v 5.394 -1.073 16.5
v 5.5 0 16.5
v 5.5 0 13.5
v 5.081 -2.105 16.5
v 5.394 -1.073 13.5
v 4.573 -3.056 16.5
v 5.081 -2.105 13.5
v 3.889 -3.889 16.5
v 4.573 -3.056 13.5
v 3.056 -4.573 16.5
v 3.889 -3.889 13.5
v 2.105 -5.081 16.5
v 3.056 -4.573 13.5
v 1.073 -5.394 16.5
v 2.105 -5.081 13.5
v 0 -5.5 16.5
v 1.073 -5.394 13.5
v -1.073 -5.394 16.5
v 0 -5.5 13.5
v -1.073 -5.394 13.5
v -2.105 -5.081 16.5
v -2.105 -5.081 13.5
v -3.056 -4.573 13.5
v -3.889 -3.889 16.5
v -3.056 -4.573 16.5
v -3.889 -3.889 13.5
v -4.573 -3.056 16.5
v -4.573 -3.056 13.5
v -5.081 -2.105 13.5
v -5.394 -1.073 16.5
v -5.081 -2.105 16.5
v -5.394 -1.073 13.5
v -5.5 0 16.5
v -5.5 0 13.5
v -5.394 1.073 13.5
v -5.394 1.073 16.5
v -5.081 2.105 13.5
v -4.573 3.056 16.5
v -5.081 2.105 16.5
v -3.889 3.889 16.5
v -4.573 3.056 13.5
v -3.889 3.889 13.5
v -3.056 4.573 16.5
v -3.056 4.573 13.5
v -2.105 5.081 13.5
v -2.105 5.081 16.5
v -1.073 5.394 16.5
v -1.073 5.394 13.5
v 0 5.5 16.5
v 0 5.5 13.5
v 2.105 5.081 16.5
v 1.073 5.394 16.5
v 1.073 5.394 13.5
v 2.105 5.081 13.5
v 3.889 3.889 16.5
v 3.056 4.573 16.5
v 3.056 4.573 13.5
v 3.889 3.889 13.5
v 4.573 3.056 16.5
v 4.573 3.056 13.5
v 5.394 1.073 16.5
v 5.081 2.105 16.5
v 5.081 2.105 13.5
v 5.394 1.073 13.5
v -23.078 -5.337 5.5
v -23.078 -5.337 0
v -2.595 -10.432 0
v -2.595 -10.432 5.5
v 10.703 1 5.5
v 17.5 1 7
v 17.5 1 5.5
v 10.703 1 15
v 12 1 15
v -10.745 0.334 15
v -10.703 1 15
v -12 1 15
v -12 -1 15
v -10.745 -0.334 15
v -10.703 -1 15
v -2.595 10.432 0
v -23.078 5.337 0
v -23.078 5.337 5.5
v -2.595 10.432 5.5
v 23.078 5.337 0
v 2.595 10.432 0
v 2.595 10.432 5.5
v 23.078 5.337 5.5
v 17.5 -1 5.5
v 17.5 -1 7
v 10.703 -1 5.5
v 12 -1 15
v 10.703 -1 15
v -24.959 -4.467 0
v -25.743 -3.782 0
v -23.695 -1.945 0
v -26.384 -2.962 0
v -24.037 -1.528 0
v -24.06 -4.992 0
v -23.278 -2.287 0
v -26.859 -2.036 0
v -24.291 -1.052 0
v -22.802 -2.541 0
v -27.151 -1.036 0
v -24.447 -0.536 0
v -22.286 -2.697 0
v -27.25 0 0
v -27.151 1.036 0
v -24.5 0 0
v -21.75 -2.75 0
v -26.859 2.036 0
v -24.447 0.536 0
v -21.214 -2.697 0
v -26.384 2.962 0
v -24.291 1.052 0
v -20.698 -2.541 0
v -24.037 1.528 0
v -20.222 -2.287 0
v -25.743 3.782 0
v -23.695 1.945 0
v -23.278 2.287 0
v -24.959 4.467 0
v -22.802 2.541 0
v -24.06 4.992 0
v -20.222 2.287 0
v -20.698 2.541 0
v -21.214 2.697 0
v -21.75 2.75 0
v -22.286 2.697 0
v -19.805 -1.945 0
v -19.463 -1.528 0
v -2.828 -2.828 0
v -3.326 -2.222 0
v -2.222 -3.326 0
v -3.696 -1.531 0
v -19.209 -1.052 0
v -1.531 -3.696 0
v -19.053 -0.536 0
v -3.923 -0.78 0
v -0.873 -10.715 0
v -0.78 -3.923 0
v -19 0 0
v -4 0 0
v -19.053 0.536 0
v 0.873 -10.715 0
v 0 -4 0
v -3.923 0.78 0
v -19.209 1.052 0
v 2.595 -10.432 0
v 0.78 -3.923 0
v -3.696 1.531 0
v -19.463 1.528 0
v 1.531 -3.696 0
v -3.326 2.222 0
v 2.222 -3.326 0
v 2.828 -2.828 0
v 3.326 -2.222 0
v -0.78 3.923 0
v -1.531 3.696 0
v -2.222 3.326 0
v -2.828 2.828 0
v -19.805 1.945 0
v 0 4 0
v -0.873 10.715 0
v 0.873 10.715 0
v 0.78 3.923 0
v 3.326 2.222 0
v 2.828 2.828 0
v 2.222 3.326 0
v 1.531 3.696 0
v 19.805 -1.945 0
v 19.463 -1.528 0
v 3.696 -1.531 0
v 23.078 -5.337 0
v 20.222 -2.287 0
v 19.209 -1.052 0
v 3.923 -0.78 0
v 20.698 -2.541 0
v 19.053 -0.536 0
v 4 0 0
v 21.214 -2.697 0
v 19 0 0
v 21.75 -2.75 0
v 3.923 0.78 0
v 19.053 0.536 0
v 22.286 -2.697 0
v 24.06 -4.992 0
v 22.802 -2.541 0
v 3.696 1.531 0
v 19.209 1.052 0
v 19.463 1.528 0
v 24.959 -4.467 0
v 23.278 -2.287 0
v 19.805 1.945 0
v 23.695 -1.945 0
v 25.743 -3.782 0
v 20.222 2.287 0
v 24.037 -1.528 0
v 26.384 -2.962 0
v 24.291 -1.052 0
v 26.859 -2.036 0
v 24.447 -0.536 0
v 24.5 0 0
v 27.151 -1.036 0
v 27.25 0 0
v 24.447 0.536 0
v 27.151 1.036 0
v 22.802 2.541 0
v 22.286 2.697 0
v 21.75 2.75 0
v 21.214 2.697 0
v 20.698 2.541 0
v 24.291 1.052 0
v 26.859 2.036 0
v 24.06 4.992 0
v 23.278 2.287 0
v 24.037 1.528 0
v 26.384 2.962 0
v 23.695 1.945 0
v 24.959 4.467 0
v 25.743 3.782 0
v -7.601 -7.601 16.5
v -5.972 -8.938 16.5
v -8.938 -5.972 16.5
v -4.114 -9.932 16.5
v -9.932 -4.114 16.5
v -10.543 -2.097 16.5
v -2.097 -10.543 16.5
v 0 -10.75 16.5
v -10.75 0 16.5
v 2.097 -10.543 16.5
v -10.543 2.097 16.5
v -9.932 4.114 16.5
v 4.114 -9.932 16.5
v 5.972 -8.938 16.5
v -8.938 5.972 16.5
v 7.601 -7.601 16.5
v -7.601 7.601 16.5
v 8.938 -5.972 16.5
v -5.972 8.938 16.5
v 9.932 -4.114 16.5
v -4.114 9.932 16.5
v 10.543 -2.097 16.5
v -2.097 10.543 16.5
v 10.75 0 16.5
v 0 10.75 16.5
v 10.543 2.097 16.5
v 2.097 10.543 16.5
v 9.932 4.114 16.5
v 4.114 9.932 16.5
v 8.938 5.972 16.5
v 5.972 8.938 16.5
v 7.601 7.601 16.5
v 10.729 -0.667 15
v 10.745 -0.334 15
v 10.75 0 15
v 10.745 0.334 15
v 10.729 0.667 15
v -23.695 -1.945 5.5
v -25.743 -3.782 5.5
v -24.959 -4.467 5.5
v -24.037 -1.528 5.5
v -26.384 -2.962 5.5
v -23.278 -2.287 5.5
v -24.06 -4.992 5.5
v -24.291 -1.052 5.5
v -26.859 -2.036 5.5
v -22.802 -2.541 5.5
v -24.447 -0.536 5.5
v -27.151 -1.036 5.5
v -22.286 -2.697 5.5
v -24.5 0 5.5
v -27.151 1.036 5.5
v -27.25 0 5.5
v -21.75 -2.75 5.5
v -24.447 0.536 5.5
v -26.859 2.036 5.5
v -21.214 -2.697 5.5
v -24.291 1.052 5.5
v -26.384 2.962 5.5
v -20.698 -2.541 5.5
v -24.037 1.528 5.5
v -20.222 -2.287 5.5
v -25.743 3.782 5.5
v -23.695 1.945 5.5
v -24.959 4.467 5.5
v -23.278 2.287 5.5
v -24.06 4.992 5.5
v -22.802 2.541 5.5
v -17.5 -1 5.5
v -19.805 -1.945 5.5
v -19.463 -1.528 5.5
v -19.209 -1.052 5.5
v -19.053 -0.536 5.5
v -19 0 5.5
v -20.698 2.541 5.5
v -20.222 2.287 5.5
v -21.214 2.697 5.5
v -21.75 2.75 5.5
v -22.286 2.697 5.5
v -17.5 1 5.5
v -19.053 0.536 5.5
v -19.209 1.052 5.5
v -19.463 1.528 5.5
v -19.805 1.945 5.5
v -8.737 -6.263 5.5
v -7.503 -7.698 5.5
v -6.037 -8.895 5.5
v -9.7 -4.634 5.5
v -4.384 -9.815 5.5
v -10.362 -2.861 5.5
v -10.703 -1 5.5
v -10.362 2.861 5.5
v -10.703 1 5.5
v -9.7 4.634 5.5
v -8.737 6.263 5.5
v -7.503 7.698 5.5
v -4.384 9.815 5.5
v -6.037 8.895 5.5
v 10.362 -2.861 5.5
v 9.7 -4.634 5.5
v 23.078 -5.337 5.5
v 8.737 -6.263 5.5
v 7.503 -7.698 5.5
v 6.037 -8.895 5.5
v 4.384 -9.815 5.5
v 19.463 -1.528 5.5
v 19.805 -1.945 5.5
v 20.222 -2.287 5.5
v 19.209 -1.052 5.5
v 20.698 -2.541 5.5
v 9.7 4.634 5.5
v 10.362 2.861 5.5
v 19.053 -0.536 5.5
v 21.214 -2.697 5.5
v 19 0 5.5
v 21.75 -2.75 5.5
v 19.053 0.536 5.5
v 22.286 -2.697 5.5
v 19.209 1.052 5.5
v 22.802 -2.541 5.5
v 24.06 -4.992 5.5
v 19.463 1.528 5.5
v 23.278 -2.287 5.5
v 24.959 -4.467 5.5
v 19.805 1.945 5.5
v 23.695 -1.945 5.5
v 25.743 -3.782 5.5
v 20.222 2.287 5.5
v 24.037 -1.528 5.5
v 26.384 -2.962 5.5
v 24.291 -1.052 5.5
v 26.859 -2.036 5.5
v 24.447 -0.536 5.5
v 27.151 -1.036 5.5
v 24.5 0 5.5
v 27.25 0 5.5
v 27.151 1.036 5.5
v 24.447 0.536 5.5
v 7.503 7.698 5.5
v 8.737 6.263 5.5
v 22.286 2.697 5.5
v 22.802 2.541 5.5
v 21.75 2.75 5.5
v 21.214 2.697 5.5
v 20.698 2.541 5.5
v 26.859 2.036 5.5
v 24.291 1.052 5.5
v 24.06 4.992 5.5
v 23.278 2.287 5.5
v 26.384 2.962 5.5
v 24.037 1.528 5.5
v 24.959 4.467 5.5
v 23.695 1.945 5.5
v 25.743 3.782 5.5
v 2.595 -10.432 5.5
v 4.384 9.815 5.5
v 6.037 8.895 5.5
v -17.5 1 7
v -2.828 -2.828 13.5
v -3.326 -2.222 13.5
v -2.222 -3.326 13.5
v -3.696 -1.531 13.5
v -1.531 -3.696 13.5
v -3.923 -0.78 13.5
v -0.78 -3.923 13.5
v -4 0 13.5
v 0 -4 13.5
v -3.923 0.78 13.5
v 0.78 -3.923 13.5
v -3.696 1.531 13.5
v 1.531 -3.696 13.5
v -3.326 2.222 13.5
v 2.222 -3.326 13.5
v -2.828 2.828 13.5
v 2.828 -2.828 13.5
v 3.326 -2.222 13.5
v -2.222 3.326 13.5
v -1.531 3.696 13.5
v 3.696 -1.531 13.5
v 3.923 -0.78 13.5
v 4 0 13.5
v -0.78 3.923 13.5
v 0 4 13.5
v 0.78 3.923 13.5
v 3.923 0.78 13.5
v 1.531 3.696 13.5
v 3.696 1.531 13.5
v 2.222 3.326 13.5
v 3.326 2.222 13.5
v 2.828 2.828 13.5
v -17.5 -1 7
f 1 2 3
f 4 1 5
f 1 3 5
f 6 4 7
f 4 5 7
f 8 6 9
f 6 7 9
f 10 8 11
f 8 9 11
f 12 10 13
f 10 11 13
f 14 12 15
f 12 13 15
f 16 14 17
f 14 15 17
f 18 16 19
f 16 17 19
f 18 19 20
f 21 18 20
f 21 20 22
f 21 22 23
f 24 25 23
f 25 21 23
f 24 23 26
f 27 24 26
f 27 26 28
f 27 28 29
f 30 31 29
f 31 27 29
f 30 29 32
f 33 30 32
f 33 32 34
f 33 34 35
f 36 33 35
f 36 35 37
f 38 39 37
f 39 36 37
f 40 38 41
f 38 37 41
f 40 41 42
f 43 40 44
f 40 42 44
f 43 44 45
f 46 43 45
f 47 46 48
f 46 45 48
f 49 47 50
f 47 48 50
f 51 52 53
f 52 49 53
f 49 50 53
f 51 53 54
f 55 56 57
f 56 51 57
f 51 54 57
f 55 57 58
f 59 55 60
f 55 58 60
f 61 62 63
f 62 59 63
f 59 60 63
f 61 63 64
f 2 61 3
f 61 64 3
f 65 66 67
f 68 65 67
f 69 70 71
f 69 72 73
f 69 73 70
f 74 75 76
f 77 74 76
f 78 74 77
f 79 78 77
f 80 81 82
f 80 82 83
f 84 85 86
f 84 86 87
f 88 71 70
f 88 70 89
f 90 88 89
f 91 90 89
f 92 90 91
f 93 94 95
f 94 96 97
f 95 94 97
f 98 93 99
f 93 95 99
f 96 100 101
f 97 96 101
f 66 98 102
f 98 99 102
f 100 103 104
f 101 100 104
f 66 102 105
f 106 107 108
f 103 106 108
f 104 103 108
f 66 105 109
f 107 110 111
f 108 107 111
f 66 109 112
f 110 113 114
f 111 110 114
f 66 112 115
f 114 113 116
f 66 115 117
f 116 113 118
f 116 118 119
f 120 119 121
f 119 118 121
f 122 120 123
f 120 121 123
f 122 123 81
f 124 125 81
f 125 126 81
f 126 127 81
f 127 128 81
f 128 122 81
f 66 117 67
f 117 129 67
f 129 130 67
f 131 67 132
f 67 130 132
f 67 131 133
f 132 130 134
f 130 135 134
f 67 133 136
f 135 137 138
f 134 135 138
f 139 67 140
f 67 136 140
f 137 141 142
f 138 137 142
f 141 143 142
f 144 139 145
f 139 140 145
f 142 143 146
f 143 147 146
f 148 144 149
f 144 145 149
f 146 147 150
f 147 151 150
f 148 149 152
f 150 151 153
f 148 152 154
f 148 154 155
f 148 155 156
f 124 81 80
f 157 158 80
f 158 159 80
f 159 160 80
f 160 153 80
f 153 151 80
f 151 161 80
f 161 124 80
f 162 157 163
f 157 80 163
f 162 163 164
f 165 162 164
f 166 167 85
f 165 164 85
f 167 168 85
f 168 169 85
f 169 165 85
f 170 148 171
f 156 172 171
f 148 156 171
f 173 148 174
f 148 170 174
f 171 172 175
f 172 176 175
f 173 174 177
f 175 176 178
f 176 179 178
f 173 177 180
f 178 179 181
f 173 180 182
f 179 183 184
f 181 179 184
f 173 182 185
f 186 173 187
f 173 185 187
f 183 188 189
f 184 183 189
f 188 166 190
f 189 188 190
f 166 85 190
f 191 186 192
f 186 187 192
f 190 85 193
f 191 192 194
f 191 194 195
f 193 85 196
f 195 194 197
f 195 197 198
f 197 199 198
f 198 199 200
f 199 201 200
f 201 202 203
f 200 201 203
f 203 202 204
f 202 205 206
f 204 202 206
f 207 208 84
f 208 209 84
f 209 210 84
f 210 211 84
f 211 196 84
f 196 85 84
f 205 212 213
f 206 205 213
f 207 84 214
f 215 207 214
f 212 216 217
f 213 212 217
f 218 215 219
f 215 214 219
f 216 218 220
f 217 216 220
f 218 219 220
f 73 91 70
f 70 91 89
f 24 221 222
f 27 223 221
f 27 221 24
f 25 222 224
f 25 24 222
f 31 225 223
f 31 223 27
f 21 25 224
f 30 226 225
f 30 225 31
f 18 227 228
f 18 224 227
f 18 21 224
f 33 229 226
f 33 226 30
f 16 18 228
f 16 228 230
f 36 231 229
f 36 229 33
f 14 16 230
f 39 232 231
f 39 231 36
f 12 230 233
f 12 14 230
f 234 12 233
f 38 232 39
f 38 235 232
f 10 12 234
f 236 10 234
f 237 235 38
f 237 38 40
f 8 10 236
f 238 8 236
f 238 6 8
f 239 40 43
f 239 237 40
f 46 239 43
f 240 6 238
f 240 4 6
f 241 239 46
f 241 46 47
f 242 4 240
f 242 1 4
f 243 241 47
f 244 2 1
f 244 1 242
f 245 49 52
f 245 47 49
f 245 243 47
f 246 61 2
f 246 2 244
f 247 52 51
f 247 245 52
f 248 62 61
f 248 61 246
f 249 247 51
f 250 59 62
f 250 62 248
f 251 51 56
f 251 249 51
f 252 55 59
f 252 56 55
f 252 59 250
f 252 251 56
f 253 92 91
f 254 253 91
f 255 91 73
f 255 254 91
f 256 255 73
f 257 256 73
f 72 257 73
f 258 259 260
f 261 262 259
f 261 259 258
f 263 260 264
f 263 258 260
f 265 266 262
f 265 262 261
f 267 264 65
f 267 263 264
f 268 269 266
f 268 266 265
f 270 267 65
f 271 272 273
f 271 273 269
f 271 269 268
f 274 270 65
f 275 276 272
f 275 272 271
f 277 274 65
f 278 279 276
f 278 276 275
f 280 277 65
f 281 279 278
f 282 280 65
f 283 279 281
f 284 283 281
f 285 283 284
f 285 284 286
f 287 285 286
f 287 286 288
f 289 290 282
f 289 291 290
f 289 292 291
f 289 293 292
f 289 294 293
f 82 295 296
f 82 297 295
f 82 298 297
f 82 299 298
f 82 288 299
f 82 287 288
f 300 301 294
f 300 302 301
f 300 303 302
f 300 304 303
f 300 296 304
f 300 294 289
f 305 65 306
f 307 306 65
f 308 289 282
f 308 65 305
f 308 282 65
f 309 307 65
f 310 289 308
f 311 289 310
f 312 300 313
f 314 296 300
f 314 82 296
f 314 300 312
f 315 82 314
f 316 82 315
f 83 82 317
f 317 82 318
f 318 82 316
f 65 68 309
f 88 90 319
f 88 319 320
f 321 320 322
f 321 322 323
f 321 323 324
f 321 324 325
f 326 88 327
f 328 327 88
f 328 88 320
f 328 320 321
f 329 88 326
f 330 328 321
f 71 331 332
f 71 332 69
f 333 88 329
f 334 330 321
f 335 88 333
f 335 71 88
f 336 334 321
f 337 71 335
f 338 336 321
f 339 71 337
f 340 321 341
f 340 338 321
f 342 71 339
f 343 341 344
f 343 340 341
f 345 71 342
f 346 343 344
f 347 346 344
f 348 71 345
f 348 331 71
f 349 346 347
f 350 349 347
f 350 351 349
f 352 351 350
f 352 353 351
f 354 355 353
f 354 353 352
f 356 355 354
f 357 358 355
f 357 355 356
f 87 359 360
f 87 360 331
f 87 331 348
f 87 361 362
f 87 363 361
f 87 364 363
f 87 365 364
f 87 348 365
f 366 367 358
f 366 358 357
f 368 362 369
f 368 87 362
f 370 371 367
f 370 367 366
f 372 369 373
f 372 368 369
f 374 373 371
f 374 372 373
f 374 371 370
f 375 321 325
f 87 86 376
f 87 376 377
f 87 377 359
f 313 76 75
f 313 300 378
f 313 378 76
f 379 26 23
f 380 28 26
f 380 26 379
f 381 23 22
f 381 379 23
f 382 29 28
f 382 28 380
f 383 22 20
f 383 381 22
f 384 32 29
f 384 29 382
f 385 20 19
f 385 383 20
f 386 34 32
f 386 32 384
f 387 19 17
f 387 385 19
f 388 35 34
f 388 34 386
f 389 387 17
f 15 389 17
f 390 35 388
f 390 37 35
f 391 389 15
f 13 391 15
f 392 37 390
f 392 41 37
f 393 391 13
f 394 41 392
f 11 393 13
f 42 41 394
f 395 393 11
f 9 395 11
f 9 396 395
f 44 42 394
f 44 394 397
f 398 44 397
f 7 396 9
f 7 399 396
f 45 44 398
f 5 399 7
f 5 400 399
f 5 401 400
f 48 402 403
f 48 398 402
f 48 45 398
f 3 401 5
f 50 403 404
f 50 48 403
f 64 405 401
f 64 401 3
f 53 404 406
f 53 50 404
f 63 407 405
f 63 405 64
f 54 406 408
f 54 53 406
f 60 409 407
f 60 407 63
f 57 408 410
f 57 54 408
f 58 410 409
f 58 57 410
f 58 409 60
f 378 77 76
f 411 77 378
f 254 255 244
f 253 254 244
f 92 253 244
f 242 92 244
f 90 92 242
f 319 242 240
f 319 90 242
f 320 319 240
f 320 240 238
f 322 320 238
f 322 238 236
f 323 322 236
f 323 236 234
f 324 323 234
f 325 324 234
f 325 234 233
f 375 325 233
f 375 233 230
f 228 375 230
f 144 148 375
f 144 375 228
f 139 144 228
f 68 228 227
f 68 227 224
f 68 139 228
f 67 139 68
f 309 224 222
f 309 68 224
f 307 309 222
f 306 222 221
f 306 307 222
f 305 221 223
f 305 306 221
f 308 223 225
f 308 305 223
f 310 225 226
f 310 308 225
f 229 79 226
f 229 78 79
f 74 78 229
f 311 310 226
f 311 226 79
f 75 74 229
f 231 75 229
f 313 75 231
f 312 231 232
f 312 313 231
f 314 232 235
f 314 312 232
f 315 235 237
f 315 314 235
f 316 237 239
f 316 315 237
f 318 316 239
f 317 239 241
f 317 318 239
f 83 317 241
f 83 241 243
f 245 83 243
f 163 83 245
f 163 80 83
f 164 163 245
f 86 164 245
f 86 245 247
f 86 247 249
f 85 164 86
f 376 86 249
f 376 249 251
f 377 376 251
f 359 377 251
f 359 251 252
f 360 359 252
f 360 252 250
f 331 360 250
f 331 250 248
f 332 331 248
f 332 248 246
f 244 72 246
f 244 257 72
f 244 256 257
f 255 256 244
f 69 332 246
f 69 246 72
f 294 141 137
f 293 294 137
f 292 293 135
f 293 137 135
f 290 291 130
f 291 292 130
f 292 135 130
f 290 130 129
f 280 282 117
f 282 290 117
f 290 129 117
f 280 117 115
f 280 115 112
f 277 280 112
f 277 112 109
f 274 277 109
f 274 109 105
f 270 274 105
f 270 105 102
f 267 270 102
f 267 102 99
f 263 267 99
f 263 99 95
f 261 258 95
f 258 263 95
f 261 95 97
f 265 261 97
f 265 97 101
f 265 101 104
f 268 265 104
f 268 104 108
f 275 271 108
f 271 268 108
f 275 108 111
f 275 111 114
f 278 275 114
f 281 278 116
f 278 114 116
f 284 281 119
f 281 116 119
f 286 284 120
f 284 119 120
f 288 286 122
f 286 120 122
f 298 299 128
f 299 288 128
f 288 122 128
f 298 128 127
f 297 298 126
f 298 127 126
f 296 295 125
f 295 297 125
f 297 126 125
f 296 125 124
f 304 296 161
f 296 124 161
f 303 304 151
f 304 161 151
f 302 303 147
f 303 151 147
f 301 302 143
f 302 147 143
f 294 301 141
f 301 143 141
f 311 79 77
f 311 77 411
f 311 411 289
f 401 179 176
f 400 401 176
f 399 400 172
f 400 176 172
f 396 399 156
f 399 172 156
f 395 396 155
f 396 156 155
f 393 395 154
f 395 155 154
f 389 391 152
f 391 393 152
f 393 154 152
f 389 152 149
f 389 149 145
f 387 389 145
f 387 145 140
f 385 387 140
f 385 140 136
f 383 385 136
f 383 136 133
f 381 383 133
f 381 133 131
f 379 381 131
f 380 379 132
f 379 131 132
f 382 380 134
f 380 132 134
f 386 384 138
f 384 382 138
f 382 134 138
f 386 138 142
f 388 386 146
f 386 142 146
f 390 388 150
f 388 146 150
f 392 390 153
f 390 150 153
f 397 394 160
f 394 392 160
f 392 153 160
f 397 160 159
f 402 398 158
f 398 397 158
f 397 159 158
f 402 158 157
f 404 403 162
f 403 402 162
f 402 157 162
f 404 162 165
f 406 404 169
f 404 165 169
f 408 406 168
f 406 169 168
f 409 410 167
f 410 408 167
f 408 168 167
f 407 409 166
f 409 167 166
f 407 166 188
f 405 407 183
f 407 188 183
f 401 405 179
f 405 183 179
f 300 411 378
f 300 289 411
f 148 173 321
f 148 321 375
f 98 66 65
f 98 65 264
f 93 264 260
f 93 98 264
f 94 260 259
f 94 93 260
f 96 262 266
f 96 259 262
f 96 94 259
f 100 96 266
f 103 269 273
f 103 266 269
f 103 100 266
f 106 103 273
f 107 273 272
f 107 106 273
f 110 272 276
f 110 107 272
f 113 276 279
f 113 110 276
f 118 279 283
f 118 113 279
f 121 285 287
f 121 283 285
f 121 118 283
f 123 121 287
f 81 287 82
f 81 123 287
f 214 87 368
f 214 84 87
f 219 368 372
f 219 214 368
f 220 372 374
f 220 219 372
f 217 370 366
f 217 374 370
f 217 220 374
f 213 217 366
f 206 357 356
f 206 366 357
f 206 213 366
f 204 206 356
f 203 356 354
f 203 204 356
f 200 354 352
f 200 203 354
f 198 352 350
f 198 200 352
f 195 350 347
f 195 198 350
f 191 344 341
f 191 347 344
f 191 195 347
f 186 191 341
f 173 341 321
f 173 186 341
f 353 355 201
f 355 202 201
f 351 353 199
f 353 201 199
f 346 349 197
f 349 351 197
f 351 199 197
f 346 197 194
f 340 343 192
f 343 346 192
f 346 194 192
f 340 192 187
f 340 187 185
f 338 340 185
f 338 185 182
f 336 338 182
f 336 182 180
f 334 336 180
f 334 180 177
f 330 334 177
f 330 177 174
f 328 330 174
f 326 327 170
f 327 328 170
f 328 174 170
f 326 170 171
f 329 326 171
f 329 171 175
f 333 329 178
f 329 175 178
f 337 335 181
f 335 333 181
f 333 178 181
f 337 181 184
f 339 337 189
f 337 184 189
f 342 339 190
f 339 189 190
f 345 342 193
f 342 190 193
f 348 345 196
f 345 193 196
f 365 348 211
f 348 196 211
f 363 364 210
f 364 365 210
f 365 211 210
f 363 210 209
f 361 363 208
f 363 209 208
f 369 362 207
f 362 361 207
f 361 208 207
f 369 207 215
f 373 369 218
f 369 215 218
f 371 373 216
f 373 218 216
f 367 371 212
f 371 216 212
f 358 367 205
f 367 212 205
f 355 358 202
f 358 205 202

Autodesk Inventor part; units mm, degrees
ref_plane "YZ Plane" through (0, 0, 0) normal (1, 0, 0) x (0, 1, 0)
ref_plane "XZ Plane" through (0, 0, 0) normal (0, 1, 0) x (-1, 0, 0)
ref_plane "XY Plane" through (0, 0, 0) normal (0, 0, 1) x (1, 0, 0)
sketch "Sketch1" plane through (0, 0, 0) normal (0, 0, 1) x (1, 0, 0)
  circle A0 centre (0, 0) radius 10.75
  circle A1 centre (0, 0) radius 5.5
  line L0 (0, 0) -> (21.75, 0) construction
  line L1 (0, 0) -> (-21.75, 0) construction
  circle A2 centre (0, 0) radius 4
  circle A3 centre (21.75, 0) radius 2.75
  circle A4 centre (-21.75, 0) radius 2.75
  arc A5 (-23.0776, 5.3374) -> (-23.0776, -5.3374) centre (-21.75, 0) ccw
  line L2 (-21.75, 0) -> (-21.75, -5.5) construction
  line L3 (-21.75, 0) -> (-21.75, 5.5) construction
  arc A6 (23.0776, -5.3374) -> (23.0776, 5.3374) centre (21.75, 0) ccw
  line L4 (21.75, 0) -> (21.75, -5.5) construction
  line L5 (21.75, 0) -> (21.75, 5.5) construction
  line L6 (-23.0776, 5.3374) -> (-2.5948, 10.4321)
  line L7 (2.5948, 10.4321) -> (23.0776, 5.3374)
  line L8 (23.0776, -5.3374) -> (2.5948, -10.4321)
  line L9 (-23.0776, -5.3374) -> (-2.5948, -10.4321)
  dimension "d0" = 21.5
  dimension "d1" = 11
  dimension "d2" = 21.75
  dimension "d3" = 21.75
  dimension "d4" = 8
  dimension "d5" = 5.5
  dimension "d6" = 5.5
  dimension "d7" = 5.5
  dimension "d8" = 180
  dimension "d9" = 5.5
  dimension "d10" = 180
extrude "Extrusion1" add sketch "Sketch1" along normal blind 5.5 contours A0 | A0 L7 A6 L8 | A0 L9 A5 L6 | A1
extrude "Extrusion2" add sketch "Sketch1" along normal blind 13.5 contours A0 | A1
extrude "Extrusion3" add sketch "Sketch1" along normal blind 16.5 contours A0
sketch "Sketch2" plane through (0, 0, 5.5) normal (0, 0, 1) x (1, 0, 0)
  line L0 (-17.5, 1) -> (-10.5, 1)
  line L1 (-10.5, 1) -> (-10.5, -1)
  line L2 (-10.5, -1) -> (-17.5, -1)
  line L3 (-17.5, -1) -> (-17.5, 1)
  line L4 (-17.5, 1) -> (-10.5, -1) construction
  line L5 (-10.5, 1) -> (-17.5, -1) construction
  line L6 (10.5, 1) -> (17.5, 1)
  line L7 (17.5, 1) -> (17.5, -1)
  line L8 (17.5, -1) -> (10.5, -1)
  line L9 (10.5, -1) -> (10.5, 1)
  line L10 (10.5, 1) -> (17.5, -1) construction
  line L11 (17.5, 1) -> (10.5, -1) construction
  circle A0 centre (0, 0) radius 10.75 projected
  point P0 (-14, 0)
  point P1 (14, 0)
  dimension "d20" = 7
  dimension "d21" = 7
  dimension "d22" = 2
  dimension "d23" = 0
  dimension "d24" = 2
  dimension "d25" = 10.5
  dimension "d26" = 10.5
extrude "Extrusion4" cut sketch "Sketch2" along normal blind 9.5 contours L0 A0 L2 L3 | L0 L1 L2 A0 | A0 L8 L9 L6 | L6 L7 L8 A0
sketch "Sketch3" plane through (10.5, -1, 5.5) normal (1, 0, 0) x (0, 0, -1)
  line L0 (-9.5, 2) -> (0, 2) projected
  line L1 (0, 0) -> (-9.5, 0) projected
  line L2 (-9.5, 2) -> (0, 2)
  line L3 (0, 2) -> (0, 0)
  line L4 (0, 0) -> (-9.5, 0)
  line L5 (-9.5, 0) -> (-9.5, 2)
  point P0 (5.5, 1)
  dimension "d29" = 9.5
  dimension "d30" = 2
sketch "Sketch4" plane through (-10.5, -1, 5.5) normal (-1, 0, 0) x (0, 0, 1)
  line L0 (9.5, 0) -> (0, 0)
  line L1 (0, 0) -> (0, 2)
  line L2 (0, 2) -> (9.5, 2)
  line L3 (9.5, 2) -> (9.5, 0)
  point P0 (-5.5, 1)
extrude "Extrusion5" add sketch "Sketch2" along normal blind 1.5 contours L0 A0 L2 L3 | L0 L1 L2 A0 | A0 L8 L9 L6 | L6 L7 L8 A0
extrude "Extrusion6" add sketch "Sketch4" along normal blind 1.5
extrude "Extrusion7" add sketch "Sketch3" along normal blind 1.5
sketch "Sketch5" plane through (10.7034, -1, 5.5) normal (0, -1, 0) x (1, 0, 0)
  line L0 (1.2966, 1.5) -> (1.2966, 9.5) projected
  line L1 (6.7966, 1.5) -> (1.2966, 1.5) projected
  line L2 (1.2966, 9.5) -> (6.7966, 1.5)
  line L3 (6.7966, 1.5) -> (1.2966, 1.5)
  line L4 (1.2966, 1.5) -> (1.2966, 9.5)
  line L5 (-22.7034, 9.5) -> (-22.7034, 1.5) projected
  line L6 (-28.2034, 0) -> (-28.2034, 1.5) projected
  line L7 (-22.7034, 9.5) -> (-28.2034, 1.5)
  line L8 (-22.7034, 1.5) -> (-28.2034, 1.5) projected
  line L9 (-28.2034, 1.5) -> (-22.7034, 1.5)
  line L10 (-22.7034, 1.5) -> (-22.7034, 9.5)
  point P0 (-10.7034, -5.5)
extrude "Extrusion8" add sketch "Sketch5" against normal blind 2
equation "\"d3\" = d2"
equation "\"d6\" = d5"
equation "\"d7\" = d5"
equation "\"d9\" = d5"
